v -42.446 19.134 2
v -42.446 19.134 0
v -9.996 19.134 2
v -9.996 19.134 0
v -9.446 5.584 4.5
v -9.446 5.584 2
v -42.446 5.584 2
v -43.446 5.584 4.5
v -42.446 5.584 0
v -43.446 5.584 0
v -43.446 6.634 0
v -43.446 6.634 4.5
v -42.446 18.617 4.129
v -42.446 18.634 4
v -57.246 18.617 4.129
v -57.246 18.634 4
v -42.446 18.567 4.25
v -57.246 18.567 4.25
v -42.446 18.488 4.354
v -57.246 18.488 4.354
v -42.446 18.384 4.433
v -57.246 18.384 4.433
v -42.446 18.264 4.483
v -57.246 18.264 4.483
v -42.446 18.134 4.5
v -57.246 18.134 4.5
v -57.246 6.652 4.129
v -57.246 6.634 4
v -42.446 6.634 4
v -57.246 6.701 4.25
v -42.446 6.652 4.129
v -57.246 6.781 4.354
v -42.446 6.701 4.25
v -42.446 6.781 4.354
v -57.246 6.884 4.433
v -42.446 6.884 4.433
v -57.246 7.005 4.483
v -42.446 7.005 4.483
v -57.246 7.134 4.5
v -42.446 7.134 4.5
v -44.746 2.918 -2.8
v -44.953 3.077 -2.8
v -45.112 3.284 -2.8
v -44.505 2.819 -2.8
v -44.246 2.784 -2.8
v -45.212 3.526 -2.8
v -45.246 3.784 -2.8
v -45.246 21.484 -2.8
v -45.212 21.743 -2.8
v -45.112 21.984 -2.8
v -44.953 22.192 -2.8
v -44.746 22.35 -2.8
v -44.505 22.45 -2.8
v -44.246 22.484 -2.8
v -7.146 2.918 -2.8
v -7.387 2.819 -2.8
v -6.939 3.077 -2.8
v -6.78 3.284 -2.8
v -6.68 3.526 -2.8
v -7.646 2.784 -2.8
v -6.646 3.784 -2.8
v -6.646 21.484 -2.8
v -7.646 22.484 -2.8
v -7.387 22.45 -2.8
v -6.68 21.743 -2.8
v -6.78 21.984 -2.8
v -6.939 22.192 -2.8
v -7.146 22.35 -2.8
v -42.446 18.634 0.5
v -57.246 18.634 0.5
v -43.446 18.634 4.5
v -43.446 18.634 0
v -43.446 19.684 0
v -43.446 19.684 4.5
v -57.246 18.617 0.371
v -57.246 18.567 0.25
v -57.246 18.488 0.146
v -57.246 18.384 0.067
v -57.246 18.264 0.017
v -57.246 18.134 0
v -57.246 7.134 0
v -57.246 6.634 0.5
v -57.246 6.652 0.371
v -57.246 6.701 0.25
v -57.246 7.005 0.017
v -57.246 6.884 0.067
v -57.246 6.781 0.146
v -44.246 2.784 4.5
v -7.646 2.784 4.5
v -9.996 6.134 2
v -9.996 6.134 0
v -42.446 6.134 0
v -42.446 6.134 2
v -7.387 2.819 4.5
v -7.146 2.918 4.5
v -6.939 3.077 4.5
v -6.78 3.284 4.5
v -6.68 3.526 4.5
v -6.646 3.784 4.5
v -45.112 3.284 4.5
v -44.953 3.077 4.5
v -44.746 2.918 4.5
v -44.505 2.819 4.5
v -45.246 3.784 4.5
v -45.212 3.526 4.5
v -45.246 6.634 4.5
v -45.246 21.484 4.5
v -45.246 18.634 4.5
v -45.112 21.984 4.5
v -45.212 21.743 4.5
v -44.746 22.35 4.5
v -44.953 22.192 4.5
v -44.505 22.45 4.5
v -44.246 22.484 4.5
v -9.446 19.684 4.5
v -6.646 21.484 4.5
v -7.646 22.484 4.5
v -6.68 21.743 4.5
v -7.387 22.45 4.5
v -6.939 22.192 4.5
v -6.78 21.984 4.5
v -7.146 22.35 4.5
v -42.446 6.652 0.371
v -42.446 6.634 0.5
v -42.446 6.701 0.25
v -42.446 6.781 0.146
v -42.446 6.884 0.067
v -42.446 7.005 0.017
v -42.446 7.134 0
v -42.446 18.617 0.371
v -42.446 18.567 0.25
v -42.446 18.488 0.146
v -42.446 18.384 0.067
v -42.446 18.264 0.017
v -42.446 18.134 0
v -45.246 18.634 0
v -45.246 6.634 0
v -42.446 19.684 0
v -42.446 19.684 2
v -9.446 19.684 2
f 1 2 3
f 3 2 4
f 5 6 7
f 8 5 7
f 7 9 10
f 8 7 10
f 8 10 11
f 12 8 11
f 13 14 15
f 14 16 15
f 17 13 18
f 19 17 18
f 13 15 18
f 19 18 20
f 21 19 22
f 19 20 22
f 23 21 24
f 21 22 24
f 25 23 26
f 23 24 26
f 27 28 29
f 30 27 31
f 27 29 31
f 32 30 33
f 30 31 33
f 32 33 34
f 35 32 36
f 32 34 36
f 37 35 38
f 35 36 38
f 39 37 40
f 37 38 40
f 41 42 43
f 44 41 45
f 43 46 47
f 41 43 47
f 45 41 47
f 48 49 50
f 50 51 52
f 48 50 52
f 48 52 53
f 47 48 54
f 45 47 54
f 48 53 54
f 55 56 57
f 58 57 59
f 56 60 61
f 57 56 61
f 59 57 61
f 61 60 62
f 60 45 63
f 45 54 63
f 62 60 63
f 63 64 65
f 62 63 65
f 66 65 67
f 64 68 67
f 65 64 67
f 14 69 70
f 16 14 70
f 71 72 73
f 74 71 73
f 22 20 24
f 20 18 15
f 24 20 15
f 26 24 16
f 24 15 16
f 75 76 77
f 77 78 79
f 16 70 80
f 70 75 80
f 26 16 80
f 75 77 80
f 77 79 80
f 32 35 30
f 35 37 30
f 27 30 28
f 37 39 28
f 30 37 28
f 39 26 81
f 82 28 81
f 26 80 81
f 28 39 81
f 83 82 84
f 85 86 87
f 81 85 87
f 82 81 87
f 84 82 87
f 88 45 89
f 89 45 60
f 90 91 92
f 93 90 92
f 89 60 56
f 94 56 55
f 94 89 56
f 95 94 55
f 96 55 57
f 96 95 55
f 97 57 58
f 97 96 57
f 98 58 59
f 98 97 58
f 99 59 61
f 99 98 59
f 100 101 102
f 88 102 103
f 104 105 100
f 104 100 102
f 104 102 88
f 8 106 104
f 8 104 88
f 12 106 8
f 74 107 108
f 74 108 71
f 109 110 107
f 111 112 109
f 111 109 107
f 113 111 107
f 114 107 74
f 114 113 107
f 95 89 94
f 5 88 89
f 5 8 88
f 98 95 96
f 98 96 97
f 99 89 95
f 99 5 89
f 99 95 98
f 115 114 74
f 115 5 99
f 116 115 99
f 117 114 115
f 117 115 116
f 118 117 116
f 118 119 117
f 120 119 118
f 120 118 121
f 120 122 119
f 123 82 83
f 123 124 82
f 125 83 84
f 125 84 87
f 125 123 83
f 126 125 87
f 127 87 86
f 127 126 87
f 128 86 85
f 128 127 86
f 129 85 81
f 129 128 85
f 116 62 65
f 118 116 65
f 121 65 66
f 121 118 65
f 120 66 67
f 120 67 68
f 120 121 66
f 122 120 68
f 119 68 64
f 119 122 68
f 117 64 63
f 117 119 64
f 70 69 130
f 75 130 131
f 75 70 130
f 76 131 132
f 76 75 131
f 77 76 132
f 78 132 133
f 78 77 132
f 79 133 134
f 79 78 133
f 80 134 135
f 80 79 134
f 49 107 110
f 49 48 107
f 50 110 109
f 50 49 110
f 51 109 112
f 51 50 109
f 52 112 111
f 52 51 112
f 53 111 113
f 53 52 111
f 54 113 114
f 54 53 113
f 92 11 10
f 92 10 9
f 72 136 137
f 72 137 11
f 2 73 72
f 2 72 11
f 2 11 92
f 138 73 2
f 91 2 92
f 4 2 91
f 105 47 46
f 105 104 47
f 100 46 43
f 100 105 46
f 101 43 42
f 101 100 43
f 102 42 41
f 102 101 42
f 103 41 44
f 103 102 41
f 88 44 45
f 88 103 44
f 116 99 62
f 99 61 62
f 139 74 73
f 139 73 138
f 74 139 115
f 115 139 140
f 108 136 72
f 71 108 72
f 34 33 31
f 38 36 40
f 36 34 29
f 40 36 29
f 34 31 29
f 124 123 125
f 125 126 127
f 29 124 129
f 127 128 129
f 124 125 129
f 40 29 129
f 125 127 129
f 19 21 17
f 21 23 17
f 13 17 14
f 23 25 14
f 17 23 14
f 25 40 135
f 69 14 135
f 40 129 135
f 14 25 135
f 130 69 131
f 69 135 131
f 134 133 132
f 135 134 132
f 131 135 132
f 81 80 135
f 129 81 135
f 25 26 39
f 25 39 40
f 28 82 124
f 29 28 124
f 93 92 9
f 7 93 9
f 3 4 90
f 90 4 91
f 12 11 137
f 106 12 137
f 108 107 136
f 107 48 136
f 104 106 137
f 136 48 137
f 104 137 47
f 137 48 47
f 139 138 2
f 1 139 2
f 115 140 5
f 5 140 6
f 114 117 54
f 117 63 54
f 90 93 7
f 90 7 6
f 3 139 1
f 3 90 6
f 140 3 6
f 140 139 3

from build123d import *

# Parameters (mm, degrees)
F1_DEPTH = 4.5
F2_R     = 0.5
F3_W     = 38.6
F3_H     = 19.7
F4_DEPTH = 2.8
F5_DEPTH = 4.5
F6_DEPTH = 2
F8_R     = 1


with BuildPart() as f1:
    # F0 (on Top) → F1 (new body)
    with BuildSketch(Plane.XY):
        Polygon((-42.4457360953, 18.6344647732), (-43.4457360953, 18.6344647732), (-45.2457360953, 18.6344647732), (-57.2457360953, 18.6344647732), (-57.2457360953, 12.6344647732), (-42.4457360953, 12.6344647732), align=None)
        Polygon((-42.4457360953, 6.6344647732), (-42.4457360953, 12.6344647732), (-57.2457360953, 12.6344647732), (-57.2457360953, 6.6344647732), (-45.2457360953, 6.6344647732), (-43.4457360953, 6.6344647732), align=None)
    extrude(amount=F1_DEPTH)

    # F2
    f2_edges = [f1.edges().sort_by_distance(p)[0] for p in [
        (-49.845736, 6.634465, 4.5),
        (-49.845736, 6.634465, 0),
        (-49.845736, 18.634465, 0),
        (-49.845736, 18.634465, 4.5),
    ]]
    fillet(f2_edges, radius=F2_R)


with BuildPart() as f4:
    # F3 (on Top) → F4 (new body)
    with BuildSketch(Plane.XY):
        with Locations((-25.9457360953, 12.6344647732)):
            Rectangle(F3_W, F3_H)
    extrude(amount=-F4_DEPTH)



with BuildPart() as f5:
    # F0 (on Top) → F5 (new body)
    with BuildSketch(Plane.XY):
        Polygon((-43.4457360953, 18.6344647732), (-43.4457360953, 19.6844647732), (-42.4457360953, 19.6844647732), (-9.4457360953, 19.6844647732), (-9.4457360953, 5.5844647732), (-42.4457360953, 5.5844647732), (-43.4457360953, 5.5844647732), (-43.4457360953, 6.6344647732), (-45.2457360953, 6.6344647732), (-45.2457360953, 2.7844647732), (-6.6457360953, 2.7844647732), (-6.6457360953, 22.4844647732), (-45.2457360953, 22.4844647732), (-45.2457360953, 18.6344647732), align=None)
    extrude(amount=F5_DEPTH)


with BuildPart() as f4_1:
    add(f4.part)

    add(f5.part)  # F6 merges F5
    # F0 (on Top) → F6 (join)
    with BuildSketch(Plane.XY):
        Polygon((-9.4457360953, 19.6844647732), (-42.4457360953, 19.6844647732), (-42.4457360953, 19.1344647732), (-9.9957360953, 19.1344647732), (-9.9957360953, 6.1344647732), (-42.4457360953, 6.1344647732), (-42.4457360953, 5.5844647732), (-9.4457360953, 5.5844647732), align=None)
    extrude(amount=F6_DEPTH)

    # F8
    f8_edges = [f4_1.edges().sort_by_distance(p)[0] for p in [
        (-45.245736, 2.784465, 0.85),
        (-45.245736, 22.484465, 0.85),
        (-6.645736, 22.484465, 0.85),
        (-6.645736, 2.784465, 0.85),
    ]]
    fillet(f8_edges, radius=F8_R)


solid = Compound([f1.part, f4_1.part])
